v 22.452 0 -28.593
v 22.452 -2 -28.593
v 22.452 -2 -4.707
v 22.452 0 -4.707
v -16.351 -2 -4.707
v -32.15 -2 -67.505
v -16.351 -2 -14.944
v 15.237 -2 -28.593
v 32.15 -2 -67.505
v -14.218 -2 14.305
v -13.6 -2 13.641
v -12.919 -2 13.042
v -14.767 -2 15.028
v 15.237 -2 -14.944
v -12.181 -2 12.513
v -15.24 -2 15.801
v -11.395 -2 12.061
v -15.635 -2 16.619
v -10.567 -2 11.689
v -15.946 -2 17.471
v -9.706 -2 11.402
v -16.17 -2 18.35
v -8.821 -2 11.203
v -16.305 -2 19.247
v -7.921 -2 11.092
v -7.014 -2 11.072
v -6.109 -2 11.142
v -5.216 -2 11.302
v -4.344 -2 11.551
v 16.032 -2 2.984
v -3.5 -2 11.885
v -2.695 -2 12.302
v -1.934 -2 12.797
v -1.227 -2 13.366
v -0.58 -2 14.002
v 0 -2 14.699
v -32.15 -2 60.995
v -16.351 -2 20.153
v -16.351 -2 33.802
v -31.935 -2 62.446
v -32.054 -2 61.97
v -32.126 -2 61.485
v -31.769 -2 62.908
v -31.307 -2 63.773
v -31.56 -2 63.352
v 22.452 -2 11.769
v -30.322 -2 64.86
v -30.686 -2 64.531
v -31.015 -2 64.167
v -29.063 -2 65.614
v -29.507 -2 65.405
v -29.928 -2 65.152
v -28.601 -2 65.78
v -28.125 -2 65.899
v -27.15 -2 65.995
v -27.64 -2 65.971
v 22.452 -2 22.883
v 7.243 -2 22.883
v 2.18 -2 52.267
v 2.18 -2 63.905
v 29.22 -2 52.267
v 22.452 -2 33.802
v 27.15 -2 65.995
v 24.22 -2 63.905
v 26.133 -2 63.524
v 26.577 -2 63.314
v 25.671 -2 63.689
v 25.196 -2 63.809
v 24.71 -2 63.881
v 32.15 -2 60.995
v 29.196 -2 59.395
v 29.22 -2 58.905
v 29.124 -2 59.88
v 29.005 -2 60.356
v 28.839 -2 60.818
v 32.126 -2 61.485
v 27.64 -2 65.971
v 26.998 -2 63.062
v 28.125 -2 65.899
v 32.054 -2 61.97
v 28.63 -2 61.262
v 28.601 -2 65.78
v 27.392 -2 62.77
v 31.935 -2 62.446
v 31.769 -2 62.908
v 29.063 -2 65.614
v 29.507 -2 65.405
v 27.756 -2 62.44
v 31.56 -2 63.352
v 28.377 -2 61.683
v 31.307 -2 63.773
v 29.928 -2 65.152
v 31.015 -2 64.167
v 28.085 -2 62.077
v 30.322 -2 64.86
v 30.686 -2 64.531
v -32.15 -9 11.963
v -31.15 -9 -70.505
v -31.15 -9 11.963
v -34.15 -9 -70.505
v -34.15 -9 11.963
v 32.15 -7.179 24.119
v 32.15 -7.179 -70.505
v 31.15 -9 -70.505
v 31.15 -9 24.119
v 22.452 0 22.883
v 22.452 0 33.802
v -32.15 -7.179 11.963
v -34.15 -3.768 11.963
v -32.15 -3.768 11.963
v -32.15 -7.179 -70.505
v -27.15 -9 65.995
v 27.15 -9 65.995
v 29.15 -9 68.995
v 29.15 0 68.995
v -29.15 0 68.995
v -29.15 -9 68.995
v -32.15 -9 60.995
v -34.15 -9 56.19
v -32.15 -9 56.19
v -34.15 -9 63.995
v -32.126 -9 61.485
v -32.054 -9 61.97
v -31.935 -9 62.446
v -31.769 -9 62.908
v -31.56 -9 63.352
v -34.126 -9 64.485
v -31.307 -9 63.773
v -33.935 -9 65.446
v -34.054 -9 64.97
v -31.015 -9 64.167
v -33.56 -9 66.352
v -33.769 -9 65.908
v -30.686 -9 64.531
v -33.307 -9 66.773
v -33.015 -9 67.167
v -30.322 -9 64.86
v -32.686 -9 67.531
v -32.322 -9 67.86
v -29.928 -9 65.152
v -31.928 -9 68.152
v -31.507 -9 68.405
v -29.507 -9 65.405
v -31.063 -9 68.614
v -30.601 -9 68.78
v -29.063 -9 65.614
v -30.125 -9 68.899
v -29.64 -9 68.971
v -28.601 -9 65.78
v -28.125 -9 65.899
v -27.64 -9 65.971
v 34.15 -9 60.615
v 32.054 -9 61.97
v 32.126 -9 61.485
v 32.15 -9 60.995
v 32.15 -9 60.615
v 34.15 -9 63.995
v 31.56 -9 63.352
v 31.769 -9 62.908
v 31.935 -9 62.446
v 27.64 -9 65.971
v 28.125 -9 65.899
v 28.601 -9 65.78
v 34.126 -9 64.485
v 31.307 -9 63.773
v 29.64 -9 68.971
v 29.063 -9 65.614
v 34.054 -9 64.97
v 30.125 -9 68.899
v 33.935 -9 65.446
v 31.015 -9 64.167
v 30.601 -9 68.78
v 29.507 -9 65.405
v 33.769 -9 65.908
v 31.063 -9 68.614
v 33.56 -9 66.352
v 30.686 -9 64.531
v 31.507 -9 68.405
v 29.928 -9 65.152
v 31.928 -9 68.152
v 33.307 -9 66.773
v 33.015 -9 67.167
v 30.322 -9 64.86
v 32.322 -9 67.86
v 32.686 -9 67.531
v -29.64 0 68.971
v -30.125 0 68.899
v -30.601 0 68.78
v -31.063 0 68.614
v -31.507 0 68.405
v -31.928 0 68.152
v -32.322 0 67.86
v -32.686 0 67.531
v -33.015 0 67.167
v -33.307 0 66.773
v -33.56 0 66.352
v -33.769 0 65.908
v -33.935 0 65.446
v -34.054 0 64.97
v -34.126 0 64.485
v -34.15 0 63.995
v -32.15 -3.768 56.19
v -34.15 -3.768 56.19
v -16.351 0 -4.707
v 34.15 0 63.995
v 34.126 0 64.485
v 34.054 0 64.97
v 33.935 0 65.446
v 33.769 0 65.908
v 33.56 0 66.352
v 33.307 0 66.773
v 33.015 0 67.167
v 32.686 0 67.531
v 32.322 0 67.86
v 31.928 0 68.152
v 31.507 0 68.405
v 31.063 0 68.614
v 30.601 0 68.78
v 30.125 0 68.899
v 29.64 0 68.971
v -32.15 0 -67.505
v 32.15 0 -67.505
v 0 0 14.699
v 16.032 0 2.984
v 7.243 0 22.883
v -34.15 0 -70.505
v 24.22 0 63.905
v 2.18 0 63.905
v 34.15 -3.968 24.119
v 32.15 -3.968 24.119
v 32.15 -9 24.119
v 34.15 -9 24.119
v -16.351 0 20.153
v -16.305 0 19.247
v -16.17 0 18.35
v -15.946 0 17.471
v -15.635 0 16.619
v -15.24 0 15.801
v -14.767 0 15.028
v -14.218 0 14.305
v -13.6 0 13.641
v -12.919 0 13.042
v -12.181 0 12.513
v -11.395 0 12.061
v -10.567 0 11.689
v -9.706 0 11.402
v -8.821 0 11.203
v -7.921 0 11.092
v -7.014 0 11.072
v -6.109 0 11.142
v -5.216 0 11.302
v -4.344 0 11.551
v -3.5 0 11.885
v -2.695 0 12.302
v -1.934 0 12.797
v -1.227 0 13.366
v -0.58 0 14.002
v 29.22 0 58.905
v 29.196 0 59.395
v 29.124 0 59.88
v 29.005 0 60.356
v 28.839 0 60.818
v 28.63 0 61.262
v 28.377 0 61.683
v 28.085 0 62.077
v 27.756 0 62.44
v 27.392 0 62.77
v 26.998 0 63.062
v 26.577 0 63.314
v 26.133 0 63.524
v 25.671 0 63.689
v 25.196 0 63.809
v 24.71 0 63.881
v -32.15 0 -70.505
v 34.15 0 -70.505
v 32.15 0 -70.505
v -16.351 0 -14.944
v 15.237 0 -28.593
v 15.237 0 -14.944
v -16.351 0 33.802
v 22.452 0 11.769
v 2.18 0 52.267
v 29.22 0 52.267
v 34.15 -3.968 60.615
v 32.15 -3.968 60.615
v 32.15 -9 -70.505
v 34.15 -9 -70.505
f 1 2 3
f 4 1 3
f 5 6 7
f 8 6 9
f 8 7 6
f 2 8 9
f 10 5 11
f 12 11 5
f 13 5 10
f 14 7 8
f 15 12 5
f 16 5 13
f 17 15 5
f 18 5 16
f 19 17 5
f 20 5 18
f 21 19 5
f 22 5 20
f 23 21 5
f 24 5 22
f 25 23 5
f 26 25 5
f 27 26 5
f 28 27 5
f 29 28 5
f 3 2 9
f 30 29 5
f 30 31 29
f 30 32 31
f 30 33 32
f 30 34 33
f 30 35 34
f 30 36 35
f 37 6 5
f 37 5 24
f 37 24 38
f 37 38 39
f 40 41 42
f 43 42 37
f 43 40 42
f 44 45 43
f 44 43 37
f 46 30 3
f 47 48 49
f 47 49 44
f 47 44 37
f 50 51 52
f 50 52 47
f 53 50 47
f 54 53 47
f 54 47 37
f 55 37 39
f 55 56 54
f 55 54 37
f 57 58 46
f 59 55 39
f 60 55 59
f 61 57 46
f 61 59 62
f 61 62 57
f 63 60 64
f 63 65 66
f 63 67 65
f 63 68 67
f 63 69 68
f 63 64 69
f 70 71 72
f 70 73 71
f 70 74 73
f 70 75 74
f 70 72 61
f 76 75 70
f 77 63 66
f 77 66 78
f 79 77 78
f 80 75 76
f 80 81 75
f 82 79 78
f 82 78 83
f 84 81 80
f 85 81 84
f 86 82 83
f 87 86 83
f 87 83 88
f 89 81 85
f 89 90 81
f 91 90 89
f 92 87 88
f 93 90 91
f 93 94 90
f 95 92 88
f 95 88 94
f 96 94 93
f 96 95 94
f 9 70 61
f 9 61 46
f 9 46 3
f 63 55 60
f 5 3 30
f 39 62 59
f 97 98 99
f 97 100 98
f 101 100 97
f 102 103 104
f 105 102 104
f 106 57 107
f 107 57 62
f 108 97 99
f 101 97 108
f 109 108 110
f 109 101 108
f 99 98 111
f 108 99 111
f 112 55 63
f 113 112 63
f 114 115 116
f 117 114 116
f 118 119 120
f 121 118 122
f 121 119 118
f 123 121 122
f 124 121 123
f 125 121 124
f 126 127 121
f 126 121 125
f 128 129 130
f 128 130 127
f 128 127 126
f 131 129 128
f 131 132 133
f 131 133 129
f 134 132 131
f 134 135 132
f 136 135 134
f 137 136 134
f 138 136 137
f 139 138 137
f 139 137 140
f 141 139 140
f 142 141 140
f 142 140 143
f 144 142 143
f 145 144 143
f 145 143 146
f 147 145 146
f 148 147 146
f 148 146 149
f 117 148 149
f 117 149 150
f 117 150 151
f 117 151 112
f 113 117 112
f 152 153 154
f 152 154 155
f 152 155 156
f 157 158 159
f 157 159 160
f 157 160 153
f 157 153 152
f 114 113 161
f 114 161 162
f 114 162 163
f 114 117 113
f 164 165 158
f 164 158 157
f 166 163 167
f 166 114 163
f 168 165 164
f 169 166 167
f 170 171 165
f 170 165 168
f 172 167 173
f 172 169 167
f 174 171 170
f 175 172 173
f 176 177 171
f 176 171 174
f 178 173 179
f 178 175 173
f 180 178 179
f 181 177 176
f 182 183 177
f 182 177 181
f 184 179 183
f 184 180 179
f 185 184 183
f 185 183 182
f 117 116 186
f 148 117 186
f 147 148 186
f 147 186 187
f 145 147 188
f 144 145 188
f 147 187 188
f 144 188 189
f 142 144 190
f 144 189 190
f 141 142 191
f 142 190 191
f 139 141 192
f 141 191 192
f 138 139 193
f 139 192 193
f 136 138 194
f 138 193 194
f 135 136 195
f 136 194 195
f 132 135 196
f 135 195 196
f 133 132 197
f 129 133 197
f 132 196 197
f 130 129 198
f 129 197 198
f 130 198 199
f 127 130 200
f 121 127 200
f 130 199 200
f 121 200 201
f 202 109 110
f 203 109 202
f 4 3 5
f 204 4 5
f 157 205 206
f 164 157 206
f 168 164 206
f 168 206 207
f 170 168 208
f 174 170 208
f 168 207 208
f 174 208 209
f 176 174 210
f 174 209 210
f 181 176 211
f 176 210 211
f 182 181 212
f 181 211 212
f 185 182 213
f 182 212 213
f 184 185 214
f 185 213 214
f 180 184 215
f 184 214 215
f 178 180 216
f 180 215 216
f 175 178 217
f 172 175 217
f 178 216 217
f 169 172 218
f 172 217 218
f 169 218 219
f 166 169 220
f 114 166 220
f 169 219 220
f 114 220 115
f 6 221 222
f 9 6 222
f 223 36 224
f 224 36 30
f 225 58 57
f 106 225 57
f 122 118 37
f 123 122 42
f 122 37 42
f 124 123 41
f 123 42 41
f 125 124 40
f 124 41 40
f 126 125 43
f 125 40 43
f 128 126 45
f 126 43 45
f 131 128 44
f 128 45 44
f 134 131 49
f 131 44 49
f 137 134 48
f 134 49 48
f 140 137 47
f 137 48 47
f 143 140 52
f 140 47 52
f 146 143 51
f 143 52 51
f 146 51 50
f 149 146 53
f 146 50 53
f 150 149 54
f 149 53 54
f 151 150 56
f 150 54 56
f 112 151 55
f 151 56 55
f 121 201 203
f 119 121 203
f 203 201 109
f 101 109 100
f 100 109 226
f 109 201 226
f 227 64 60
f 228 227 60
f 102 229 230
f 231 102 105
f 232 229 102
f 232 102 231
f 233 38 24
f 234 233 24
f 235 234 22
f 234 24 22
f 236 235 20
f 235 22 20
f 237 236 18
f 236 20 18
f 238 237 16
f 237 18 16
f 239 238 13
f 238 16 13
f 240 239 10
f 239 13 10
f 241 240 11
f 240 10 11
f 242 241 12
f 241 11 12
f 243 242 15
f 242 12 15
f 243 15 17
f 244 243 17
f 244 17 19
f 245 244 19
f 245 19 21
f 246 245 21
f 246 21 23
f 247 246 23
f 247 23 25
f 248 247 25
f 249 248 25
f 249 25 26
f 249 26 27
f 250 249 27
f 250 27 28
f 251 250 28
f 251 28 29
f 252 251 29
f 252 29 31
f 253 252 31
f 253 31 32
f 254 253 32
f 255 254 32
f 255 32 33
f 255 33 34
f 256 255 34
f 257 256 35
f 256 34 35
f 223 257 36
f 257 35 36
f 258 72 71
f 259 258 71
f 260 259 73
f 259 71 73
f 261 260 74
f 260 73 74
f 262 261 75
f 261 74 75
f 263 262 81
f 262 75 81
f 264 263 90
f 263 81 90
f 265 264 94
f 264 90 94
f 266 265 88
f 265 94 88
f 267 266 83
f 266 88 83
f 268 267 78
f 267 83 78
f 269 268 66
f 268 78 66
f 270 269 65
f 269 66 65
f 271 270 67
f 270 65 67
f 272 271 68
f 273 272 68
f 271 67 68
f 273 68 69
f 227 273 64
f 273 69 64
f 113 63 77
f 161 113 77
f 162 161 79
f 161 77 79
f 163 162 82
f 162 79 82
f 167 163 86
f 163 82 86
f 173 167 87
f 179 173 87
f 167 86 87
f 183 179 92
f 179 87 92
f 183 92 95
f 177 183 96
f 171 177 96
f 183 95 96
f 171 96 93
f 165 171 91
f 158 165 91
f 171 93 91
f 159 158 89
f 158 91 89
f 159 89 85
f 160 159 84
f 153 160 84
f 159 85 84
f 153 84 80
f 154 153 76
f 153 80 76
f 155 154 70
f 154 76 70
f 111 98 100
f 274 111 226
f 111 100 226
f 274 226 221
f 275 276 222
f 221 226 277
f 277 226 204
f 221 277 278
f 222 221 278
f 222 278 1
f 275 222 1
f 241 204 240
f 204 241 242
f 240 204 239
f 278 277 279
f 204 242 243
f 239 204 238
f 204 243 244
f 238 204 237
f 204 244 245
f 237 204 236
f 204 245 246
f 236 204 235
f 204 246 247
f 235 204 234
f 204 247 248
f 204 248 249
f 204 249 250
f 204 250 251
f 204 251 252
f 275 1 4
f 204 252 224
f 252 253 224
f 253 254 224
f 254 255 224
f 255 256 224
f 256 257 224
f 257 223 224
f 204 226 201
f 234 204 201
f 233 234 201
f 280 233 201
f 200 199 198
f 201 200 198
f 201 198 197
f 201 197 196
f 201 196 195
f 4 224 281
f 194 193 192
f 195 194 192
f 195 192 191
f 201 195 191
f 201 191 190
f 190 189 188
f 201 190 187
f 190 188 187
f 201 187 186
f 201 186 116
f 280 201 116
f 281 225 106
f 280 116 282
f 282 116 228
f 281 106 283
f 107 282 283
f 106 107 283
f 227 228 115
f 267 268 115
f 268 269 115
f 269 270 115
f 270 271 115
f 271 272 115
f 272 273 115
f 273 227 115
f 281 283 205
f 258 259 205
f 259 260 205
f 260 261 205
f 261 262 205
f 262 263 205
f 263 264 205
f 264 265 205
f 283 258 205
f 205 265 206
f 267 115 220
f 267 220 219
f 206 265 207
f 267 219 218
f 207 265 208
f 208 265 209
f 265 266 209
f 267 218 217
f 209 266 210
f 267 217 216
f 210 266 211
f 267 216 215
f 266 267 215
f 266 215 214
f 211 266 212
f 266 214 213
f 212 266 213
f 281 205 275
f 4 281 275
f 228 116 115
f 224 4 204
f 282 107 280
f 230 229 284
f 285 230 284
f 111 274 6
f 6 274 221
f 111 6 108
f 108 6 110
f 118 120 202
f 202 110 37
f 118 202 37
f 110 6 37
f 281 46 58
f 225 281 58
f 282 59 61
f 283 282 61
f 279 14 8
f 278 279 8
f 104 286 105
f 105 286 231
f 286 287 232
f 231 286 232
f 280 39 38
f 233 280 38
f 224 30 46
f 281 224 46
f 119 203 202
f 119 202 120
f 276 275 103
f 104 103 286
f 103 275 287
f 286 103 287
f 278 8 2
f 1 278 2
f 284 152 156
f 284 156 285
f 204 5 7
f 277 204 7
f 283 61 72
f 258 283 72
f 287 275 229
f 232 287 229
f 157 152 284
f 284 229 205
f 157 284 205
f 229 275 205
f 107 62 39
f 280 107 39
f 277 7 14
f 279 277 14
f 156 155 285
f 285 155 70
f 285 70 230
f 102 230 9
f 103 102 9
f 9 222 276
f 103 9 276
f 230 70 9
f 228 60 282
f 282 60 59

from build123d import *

# Parameters (mm, degrees)
F1_DEPTH  = 2
F2_DEPTH  = 9
F3_W      = 5.0319702644
F3_H      = 36.4959277213
F4_DEPTH  = 5
F5_W      = 5.2322996128
F5_H      = 44.2271307111
F6_DEPTH  = 5
F8_DEPTH  = 10
F9_R      = 5.0696184715
F10_DEPTH = 25
F11_W     = 1.8213601708
F11_H     = 94.6240146787
F12_DEPTH = 1
F13_W     = 1.82136
F13_H     = 82.468239698
F14_DEPTH = 1
F16_DEPTH = 95
F18_DEPTH = 85


with BuildPart() as f1:
    # F0 (on Front) → F1 (new body)
    with BuildSketch(Plane.XZ):
        with BuildLine():
            Line((-32.15, -67.5050175221), (32.15, -67.5050175221))
            Line((32.15, -67.5050175221), (32.15, 60.9949824779))
            ThreePointArc((32.15, 60.9949824779), (30.6855339059, 64.5305163838), (27.15, 65.9949824779))
            Line((27.15, 65.9949824779), (-27.15, 65.9949824779))
            ThreePointArc((-27.15, 65.9949824779), (-30.6855339059, 64.5305163838), (-32.15, 60.9949824779))
            Line((-32.15, 60.9949824779), (-32.15, -67.5050175221))
        make_face()
    extrude(amount=F1_DEPTH)

    # F0 (on Front) → F2 (join)
    with BuildSketch(Plane.XZ):
        with BuildLine():
            Line((32.15, -70.5050175221), (34.15, -70.5050175221))
            Line((34.15, -70.5050175221), (34.15, 63.9949824779))
            ThreePointArc((34.15, 63.9949824779), (32.6855339059, 67.5305163838), (29.15, 68.9949824779))
            Line((29.15, 68.9949824779), (-29.15, 68.9949824779))
            ThreePointArc((-29.15, 68.9949824779), (-32.6855339059, 67.5305163838), (-34.15, 63.9949824779))
            Line((-34.15, 63.9949824779), (-34.15, -70.5050175221))
            Line((-34.15, -70.5050175221), (-32.15, -70.5050175221))
            Line((-32.15, -70.5050175221), (-32.15, -67.5050175221))
            Line((-32.15, -67.5050175221), (-32.15, 60.9949824779))
            ThreePointArc((-32.15, 60.9949824779), (-30.6855339059, 64.5305163838), (-27.15, 65.9949824779))
            Line((-27.15, 65.9949824779), (27.15, 65.9949824779))
            ThreePointArc((27.15, 65.9949824779), (30.6855339059, 64.5305163838), (32.15, 60.9949824779))
            Line((32.15, 60.9949824779), (32.15, -67.5050175221))
            Line((32.15, -67.5050175221), (32.15, -70.5050175221))
        make_face()
    extrude(amount=F2_DEPTH)

    # F3 (on face) → F4 (cut)
    with BuildSketch(Plane.YZ.offset(34.15)):
        with Locations((-6.4840148678, 42.3669610173)):
            Rectangle(F3_W, F3_H)
    extrude(amount=-F4_DEPTH, mode=Mode.SUBTRACT)

    # F5 (on face) → F6 (cut)
    with BuildSketch(Plane(origin=(-34.15, 0, 0), x_dir=(0, -1, 0), z_dir=(-1, 0, 0))):
        with Locations((6.3838501936, 34.0767875314)):
            Rectangle(F5_W, F5_H)
    extrude(amount=-F6_DEPTH, mode=Mode.SUBTRACT)

    # F7 (on face) → F8 (cut)
    with BuildSketch(Plane.XZ.offset(2)):
        with BuildLine():
            Line((2.180054551, 63.9047697186), (2.180054551, 52.2672943771))
            Line((2.180054551, 52.2672943771), (29.2200669646, 52.2672943771))
            Line((29.2200669646, 52.2672943771), (29.2200669646, 58.9047697186))
            ThreePointArc((29.2200669646, 58.9047697186), (27.7556008706, 62.4403036246), (24.2200669646, 63.9047697186))
            Line((24.2200669646, 63.9047697186), (2.180054551, 63.9047697186))
        make_face()
    extrude(amount=-F8_DEPTH, mode=Mode.SUBTRACT)

    # F9 (on face) → F10 (cut)
    with BuildSketch(Plane.XZ.offset(2)):
        Polygon((22.451505065, -4.7073736787), (-16.3505785167, -4.7073736787), (-16.3505785167, -14.9441054091), (15.2370482683, -14.9441054091), (15.2370482683, -28.5930782557), (22.451505065, -28.5930782557), align=None)
        with BuildLine():
            Line((22.451505065, 33.8022336364), (-16.3505785167, 33.8022336364))
            Line((-16.3505785167, 33.8022336364), (-16.3505785167, 20.1532579958))
            ThreePointArc((-16.3505785167, 20.1532579958), (-10.1403629568, 11.5351459717), (0, 14.6992684827))
            Line((0, 14.6992684827), (16.0316545011, 2.9838289004))
            Line((16.0316545011, 2.9838289004), (22.451505065, 11.7688877508))
            Line((22.451505065, 11.7688877508), (7.2426483966, 22.8830520064))
            Line((7.2426483966, 22.8830520064), (22.451505065, 22.8830520064))
            Line((22.451505065, 22.8830520064), (22.451505065, 33.8022336364))
        make_face()
        with Locations((-7.3812524788, 24.0529645234)):
            Circle(F9_R, mode=Mode.SUBTRACT)
        with Locations((-7.3812524788, 24.0529645234)):
            Circle(F9_R)
    extrude(amount=-F10_DEPTH, mode=Mode.SUBTRACT)

    # F11 (on face) → F12 (join)
    with BuildSketch(Plane(origin=(32.15, 0, 0), x_dir=(0, -1, 0), z_dir=(-1, 0, 0))):
        with Locations((8.0893199146, -23.1930101828)):
            Rectangle(F11_W, F11_H)
    extrude(amount=F12_DEPTH)

    # F13 (on face) → F14 (join)
    with BuildSketch(Plane.YZ.offset(-32.15)):
        with Locations((-8.08932, -29.2708976731)):
            Rectangle(F13_W, F13_H)
    extrude(amount=F14_DEPTH)

    # F15 (on face) → F16 (cut)
    with BuildSketch(Plane(origin=(0, 0, -70.5050175221), x_dir=(1, 0, 0), z_dir=(0, 0, -1))):
        Polygon((31.15, 7.1786398292), (32.15, 7.1786398292), (31.15, 9), align=None)
    extrude(amount=-F16_DEPTH, mode=Mode.SUBTRACT)

    # F17 (on face) → F18 (cut)
    with BuildSketch(Plane(origin=(0, 0, -70.5050175221), x_dir=(1, 0, 0), z_dir=(0, 0, -1))):
        Polygon((-31.15, 9), (-32.15, 7.17864), (-31.15, 7.17864), align=None)
    extrude(amount=-F18_DEPTH, mode=Mode.SUBTRACT)


solid = f1.part
